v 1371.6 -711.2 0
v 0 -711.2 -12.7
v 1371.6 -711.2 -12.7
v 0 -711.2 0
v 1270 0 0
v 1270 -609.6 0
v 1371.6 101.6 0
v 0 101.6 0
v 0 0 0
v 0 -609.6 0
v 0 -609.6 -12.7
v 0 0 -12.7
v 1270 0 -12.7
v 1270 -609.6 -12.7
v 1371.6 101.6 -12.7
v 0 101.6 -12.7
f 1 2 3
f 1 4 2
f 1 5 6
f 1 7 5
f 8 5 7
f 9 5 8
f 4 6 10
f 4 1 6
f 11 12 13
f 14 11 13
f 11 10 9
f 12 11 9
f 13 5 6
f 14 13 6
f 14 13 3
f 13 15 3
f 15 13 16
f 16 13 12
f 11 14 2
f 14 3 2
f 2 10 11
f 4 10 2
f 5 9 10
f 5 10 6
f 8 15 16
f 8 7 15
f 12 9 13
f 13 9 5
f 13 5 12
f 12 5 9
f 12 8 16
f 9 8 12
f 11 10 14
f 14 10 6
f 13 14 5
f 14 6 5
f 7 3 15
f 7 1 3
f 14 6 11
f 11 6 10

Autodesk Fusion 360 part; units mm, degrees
sketch "Sketch1" plane through (0, 0, 0) normal (0, 0, 1) x (1, 0, 0)
  line L0 (0, 0) -> (1270, 0)
  line L1 (1270, 0) -> (1270, -609.6)
  line L2 (1270, -609.6) -> (0, -609.6)
  line L3 (0, -609.6) -> (0, 0)
  dimension "d1" = 1270
  dimension "d2" = 609.6
extrude "Extrude1" add sketch "Sketch1" against normal blind 12.7 makes body 1
sketch "Sketch2" plane through (0, 0, 0) normal (0, 0, 1) x (-1, 0, 0)
  line L0 (0, 609.6) -> (-1270, 609.6)
  line L1 (-1270, 609.6) -> (-1270, 0)
  line L2 (-1270, 0) -> (0, 0)
  line L3 (0, 0) -> (0, 609.6)
  line L4 (0, 711.2) -> (-1371.6, 711.2)
  line L5 (-1371.6, 711.2) -> (-1371.6, -101.6)
  line L6 (-1371.6, -101.6) -> (0, -101.6)
  line L7 (0, -101.6) -> (0, 711.2)
  dimension "d5" = 101.6
extrude "Extrude1'" add sketch "Sketch2" against normal blind 12.7 separate body contours L0 L1 L2 L4 L5 L6 L7 makes body 2 in component "Component"
copy_body "CutPasteBodies1" bodies 1 removing the originals makes body 3 in component "Component"
component "Component" placed x (1, 0, 0) y (0, 1, 0) z (0, 0, 1) at (0, 0, 0)
